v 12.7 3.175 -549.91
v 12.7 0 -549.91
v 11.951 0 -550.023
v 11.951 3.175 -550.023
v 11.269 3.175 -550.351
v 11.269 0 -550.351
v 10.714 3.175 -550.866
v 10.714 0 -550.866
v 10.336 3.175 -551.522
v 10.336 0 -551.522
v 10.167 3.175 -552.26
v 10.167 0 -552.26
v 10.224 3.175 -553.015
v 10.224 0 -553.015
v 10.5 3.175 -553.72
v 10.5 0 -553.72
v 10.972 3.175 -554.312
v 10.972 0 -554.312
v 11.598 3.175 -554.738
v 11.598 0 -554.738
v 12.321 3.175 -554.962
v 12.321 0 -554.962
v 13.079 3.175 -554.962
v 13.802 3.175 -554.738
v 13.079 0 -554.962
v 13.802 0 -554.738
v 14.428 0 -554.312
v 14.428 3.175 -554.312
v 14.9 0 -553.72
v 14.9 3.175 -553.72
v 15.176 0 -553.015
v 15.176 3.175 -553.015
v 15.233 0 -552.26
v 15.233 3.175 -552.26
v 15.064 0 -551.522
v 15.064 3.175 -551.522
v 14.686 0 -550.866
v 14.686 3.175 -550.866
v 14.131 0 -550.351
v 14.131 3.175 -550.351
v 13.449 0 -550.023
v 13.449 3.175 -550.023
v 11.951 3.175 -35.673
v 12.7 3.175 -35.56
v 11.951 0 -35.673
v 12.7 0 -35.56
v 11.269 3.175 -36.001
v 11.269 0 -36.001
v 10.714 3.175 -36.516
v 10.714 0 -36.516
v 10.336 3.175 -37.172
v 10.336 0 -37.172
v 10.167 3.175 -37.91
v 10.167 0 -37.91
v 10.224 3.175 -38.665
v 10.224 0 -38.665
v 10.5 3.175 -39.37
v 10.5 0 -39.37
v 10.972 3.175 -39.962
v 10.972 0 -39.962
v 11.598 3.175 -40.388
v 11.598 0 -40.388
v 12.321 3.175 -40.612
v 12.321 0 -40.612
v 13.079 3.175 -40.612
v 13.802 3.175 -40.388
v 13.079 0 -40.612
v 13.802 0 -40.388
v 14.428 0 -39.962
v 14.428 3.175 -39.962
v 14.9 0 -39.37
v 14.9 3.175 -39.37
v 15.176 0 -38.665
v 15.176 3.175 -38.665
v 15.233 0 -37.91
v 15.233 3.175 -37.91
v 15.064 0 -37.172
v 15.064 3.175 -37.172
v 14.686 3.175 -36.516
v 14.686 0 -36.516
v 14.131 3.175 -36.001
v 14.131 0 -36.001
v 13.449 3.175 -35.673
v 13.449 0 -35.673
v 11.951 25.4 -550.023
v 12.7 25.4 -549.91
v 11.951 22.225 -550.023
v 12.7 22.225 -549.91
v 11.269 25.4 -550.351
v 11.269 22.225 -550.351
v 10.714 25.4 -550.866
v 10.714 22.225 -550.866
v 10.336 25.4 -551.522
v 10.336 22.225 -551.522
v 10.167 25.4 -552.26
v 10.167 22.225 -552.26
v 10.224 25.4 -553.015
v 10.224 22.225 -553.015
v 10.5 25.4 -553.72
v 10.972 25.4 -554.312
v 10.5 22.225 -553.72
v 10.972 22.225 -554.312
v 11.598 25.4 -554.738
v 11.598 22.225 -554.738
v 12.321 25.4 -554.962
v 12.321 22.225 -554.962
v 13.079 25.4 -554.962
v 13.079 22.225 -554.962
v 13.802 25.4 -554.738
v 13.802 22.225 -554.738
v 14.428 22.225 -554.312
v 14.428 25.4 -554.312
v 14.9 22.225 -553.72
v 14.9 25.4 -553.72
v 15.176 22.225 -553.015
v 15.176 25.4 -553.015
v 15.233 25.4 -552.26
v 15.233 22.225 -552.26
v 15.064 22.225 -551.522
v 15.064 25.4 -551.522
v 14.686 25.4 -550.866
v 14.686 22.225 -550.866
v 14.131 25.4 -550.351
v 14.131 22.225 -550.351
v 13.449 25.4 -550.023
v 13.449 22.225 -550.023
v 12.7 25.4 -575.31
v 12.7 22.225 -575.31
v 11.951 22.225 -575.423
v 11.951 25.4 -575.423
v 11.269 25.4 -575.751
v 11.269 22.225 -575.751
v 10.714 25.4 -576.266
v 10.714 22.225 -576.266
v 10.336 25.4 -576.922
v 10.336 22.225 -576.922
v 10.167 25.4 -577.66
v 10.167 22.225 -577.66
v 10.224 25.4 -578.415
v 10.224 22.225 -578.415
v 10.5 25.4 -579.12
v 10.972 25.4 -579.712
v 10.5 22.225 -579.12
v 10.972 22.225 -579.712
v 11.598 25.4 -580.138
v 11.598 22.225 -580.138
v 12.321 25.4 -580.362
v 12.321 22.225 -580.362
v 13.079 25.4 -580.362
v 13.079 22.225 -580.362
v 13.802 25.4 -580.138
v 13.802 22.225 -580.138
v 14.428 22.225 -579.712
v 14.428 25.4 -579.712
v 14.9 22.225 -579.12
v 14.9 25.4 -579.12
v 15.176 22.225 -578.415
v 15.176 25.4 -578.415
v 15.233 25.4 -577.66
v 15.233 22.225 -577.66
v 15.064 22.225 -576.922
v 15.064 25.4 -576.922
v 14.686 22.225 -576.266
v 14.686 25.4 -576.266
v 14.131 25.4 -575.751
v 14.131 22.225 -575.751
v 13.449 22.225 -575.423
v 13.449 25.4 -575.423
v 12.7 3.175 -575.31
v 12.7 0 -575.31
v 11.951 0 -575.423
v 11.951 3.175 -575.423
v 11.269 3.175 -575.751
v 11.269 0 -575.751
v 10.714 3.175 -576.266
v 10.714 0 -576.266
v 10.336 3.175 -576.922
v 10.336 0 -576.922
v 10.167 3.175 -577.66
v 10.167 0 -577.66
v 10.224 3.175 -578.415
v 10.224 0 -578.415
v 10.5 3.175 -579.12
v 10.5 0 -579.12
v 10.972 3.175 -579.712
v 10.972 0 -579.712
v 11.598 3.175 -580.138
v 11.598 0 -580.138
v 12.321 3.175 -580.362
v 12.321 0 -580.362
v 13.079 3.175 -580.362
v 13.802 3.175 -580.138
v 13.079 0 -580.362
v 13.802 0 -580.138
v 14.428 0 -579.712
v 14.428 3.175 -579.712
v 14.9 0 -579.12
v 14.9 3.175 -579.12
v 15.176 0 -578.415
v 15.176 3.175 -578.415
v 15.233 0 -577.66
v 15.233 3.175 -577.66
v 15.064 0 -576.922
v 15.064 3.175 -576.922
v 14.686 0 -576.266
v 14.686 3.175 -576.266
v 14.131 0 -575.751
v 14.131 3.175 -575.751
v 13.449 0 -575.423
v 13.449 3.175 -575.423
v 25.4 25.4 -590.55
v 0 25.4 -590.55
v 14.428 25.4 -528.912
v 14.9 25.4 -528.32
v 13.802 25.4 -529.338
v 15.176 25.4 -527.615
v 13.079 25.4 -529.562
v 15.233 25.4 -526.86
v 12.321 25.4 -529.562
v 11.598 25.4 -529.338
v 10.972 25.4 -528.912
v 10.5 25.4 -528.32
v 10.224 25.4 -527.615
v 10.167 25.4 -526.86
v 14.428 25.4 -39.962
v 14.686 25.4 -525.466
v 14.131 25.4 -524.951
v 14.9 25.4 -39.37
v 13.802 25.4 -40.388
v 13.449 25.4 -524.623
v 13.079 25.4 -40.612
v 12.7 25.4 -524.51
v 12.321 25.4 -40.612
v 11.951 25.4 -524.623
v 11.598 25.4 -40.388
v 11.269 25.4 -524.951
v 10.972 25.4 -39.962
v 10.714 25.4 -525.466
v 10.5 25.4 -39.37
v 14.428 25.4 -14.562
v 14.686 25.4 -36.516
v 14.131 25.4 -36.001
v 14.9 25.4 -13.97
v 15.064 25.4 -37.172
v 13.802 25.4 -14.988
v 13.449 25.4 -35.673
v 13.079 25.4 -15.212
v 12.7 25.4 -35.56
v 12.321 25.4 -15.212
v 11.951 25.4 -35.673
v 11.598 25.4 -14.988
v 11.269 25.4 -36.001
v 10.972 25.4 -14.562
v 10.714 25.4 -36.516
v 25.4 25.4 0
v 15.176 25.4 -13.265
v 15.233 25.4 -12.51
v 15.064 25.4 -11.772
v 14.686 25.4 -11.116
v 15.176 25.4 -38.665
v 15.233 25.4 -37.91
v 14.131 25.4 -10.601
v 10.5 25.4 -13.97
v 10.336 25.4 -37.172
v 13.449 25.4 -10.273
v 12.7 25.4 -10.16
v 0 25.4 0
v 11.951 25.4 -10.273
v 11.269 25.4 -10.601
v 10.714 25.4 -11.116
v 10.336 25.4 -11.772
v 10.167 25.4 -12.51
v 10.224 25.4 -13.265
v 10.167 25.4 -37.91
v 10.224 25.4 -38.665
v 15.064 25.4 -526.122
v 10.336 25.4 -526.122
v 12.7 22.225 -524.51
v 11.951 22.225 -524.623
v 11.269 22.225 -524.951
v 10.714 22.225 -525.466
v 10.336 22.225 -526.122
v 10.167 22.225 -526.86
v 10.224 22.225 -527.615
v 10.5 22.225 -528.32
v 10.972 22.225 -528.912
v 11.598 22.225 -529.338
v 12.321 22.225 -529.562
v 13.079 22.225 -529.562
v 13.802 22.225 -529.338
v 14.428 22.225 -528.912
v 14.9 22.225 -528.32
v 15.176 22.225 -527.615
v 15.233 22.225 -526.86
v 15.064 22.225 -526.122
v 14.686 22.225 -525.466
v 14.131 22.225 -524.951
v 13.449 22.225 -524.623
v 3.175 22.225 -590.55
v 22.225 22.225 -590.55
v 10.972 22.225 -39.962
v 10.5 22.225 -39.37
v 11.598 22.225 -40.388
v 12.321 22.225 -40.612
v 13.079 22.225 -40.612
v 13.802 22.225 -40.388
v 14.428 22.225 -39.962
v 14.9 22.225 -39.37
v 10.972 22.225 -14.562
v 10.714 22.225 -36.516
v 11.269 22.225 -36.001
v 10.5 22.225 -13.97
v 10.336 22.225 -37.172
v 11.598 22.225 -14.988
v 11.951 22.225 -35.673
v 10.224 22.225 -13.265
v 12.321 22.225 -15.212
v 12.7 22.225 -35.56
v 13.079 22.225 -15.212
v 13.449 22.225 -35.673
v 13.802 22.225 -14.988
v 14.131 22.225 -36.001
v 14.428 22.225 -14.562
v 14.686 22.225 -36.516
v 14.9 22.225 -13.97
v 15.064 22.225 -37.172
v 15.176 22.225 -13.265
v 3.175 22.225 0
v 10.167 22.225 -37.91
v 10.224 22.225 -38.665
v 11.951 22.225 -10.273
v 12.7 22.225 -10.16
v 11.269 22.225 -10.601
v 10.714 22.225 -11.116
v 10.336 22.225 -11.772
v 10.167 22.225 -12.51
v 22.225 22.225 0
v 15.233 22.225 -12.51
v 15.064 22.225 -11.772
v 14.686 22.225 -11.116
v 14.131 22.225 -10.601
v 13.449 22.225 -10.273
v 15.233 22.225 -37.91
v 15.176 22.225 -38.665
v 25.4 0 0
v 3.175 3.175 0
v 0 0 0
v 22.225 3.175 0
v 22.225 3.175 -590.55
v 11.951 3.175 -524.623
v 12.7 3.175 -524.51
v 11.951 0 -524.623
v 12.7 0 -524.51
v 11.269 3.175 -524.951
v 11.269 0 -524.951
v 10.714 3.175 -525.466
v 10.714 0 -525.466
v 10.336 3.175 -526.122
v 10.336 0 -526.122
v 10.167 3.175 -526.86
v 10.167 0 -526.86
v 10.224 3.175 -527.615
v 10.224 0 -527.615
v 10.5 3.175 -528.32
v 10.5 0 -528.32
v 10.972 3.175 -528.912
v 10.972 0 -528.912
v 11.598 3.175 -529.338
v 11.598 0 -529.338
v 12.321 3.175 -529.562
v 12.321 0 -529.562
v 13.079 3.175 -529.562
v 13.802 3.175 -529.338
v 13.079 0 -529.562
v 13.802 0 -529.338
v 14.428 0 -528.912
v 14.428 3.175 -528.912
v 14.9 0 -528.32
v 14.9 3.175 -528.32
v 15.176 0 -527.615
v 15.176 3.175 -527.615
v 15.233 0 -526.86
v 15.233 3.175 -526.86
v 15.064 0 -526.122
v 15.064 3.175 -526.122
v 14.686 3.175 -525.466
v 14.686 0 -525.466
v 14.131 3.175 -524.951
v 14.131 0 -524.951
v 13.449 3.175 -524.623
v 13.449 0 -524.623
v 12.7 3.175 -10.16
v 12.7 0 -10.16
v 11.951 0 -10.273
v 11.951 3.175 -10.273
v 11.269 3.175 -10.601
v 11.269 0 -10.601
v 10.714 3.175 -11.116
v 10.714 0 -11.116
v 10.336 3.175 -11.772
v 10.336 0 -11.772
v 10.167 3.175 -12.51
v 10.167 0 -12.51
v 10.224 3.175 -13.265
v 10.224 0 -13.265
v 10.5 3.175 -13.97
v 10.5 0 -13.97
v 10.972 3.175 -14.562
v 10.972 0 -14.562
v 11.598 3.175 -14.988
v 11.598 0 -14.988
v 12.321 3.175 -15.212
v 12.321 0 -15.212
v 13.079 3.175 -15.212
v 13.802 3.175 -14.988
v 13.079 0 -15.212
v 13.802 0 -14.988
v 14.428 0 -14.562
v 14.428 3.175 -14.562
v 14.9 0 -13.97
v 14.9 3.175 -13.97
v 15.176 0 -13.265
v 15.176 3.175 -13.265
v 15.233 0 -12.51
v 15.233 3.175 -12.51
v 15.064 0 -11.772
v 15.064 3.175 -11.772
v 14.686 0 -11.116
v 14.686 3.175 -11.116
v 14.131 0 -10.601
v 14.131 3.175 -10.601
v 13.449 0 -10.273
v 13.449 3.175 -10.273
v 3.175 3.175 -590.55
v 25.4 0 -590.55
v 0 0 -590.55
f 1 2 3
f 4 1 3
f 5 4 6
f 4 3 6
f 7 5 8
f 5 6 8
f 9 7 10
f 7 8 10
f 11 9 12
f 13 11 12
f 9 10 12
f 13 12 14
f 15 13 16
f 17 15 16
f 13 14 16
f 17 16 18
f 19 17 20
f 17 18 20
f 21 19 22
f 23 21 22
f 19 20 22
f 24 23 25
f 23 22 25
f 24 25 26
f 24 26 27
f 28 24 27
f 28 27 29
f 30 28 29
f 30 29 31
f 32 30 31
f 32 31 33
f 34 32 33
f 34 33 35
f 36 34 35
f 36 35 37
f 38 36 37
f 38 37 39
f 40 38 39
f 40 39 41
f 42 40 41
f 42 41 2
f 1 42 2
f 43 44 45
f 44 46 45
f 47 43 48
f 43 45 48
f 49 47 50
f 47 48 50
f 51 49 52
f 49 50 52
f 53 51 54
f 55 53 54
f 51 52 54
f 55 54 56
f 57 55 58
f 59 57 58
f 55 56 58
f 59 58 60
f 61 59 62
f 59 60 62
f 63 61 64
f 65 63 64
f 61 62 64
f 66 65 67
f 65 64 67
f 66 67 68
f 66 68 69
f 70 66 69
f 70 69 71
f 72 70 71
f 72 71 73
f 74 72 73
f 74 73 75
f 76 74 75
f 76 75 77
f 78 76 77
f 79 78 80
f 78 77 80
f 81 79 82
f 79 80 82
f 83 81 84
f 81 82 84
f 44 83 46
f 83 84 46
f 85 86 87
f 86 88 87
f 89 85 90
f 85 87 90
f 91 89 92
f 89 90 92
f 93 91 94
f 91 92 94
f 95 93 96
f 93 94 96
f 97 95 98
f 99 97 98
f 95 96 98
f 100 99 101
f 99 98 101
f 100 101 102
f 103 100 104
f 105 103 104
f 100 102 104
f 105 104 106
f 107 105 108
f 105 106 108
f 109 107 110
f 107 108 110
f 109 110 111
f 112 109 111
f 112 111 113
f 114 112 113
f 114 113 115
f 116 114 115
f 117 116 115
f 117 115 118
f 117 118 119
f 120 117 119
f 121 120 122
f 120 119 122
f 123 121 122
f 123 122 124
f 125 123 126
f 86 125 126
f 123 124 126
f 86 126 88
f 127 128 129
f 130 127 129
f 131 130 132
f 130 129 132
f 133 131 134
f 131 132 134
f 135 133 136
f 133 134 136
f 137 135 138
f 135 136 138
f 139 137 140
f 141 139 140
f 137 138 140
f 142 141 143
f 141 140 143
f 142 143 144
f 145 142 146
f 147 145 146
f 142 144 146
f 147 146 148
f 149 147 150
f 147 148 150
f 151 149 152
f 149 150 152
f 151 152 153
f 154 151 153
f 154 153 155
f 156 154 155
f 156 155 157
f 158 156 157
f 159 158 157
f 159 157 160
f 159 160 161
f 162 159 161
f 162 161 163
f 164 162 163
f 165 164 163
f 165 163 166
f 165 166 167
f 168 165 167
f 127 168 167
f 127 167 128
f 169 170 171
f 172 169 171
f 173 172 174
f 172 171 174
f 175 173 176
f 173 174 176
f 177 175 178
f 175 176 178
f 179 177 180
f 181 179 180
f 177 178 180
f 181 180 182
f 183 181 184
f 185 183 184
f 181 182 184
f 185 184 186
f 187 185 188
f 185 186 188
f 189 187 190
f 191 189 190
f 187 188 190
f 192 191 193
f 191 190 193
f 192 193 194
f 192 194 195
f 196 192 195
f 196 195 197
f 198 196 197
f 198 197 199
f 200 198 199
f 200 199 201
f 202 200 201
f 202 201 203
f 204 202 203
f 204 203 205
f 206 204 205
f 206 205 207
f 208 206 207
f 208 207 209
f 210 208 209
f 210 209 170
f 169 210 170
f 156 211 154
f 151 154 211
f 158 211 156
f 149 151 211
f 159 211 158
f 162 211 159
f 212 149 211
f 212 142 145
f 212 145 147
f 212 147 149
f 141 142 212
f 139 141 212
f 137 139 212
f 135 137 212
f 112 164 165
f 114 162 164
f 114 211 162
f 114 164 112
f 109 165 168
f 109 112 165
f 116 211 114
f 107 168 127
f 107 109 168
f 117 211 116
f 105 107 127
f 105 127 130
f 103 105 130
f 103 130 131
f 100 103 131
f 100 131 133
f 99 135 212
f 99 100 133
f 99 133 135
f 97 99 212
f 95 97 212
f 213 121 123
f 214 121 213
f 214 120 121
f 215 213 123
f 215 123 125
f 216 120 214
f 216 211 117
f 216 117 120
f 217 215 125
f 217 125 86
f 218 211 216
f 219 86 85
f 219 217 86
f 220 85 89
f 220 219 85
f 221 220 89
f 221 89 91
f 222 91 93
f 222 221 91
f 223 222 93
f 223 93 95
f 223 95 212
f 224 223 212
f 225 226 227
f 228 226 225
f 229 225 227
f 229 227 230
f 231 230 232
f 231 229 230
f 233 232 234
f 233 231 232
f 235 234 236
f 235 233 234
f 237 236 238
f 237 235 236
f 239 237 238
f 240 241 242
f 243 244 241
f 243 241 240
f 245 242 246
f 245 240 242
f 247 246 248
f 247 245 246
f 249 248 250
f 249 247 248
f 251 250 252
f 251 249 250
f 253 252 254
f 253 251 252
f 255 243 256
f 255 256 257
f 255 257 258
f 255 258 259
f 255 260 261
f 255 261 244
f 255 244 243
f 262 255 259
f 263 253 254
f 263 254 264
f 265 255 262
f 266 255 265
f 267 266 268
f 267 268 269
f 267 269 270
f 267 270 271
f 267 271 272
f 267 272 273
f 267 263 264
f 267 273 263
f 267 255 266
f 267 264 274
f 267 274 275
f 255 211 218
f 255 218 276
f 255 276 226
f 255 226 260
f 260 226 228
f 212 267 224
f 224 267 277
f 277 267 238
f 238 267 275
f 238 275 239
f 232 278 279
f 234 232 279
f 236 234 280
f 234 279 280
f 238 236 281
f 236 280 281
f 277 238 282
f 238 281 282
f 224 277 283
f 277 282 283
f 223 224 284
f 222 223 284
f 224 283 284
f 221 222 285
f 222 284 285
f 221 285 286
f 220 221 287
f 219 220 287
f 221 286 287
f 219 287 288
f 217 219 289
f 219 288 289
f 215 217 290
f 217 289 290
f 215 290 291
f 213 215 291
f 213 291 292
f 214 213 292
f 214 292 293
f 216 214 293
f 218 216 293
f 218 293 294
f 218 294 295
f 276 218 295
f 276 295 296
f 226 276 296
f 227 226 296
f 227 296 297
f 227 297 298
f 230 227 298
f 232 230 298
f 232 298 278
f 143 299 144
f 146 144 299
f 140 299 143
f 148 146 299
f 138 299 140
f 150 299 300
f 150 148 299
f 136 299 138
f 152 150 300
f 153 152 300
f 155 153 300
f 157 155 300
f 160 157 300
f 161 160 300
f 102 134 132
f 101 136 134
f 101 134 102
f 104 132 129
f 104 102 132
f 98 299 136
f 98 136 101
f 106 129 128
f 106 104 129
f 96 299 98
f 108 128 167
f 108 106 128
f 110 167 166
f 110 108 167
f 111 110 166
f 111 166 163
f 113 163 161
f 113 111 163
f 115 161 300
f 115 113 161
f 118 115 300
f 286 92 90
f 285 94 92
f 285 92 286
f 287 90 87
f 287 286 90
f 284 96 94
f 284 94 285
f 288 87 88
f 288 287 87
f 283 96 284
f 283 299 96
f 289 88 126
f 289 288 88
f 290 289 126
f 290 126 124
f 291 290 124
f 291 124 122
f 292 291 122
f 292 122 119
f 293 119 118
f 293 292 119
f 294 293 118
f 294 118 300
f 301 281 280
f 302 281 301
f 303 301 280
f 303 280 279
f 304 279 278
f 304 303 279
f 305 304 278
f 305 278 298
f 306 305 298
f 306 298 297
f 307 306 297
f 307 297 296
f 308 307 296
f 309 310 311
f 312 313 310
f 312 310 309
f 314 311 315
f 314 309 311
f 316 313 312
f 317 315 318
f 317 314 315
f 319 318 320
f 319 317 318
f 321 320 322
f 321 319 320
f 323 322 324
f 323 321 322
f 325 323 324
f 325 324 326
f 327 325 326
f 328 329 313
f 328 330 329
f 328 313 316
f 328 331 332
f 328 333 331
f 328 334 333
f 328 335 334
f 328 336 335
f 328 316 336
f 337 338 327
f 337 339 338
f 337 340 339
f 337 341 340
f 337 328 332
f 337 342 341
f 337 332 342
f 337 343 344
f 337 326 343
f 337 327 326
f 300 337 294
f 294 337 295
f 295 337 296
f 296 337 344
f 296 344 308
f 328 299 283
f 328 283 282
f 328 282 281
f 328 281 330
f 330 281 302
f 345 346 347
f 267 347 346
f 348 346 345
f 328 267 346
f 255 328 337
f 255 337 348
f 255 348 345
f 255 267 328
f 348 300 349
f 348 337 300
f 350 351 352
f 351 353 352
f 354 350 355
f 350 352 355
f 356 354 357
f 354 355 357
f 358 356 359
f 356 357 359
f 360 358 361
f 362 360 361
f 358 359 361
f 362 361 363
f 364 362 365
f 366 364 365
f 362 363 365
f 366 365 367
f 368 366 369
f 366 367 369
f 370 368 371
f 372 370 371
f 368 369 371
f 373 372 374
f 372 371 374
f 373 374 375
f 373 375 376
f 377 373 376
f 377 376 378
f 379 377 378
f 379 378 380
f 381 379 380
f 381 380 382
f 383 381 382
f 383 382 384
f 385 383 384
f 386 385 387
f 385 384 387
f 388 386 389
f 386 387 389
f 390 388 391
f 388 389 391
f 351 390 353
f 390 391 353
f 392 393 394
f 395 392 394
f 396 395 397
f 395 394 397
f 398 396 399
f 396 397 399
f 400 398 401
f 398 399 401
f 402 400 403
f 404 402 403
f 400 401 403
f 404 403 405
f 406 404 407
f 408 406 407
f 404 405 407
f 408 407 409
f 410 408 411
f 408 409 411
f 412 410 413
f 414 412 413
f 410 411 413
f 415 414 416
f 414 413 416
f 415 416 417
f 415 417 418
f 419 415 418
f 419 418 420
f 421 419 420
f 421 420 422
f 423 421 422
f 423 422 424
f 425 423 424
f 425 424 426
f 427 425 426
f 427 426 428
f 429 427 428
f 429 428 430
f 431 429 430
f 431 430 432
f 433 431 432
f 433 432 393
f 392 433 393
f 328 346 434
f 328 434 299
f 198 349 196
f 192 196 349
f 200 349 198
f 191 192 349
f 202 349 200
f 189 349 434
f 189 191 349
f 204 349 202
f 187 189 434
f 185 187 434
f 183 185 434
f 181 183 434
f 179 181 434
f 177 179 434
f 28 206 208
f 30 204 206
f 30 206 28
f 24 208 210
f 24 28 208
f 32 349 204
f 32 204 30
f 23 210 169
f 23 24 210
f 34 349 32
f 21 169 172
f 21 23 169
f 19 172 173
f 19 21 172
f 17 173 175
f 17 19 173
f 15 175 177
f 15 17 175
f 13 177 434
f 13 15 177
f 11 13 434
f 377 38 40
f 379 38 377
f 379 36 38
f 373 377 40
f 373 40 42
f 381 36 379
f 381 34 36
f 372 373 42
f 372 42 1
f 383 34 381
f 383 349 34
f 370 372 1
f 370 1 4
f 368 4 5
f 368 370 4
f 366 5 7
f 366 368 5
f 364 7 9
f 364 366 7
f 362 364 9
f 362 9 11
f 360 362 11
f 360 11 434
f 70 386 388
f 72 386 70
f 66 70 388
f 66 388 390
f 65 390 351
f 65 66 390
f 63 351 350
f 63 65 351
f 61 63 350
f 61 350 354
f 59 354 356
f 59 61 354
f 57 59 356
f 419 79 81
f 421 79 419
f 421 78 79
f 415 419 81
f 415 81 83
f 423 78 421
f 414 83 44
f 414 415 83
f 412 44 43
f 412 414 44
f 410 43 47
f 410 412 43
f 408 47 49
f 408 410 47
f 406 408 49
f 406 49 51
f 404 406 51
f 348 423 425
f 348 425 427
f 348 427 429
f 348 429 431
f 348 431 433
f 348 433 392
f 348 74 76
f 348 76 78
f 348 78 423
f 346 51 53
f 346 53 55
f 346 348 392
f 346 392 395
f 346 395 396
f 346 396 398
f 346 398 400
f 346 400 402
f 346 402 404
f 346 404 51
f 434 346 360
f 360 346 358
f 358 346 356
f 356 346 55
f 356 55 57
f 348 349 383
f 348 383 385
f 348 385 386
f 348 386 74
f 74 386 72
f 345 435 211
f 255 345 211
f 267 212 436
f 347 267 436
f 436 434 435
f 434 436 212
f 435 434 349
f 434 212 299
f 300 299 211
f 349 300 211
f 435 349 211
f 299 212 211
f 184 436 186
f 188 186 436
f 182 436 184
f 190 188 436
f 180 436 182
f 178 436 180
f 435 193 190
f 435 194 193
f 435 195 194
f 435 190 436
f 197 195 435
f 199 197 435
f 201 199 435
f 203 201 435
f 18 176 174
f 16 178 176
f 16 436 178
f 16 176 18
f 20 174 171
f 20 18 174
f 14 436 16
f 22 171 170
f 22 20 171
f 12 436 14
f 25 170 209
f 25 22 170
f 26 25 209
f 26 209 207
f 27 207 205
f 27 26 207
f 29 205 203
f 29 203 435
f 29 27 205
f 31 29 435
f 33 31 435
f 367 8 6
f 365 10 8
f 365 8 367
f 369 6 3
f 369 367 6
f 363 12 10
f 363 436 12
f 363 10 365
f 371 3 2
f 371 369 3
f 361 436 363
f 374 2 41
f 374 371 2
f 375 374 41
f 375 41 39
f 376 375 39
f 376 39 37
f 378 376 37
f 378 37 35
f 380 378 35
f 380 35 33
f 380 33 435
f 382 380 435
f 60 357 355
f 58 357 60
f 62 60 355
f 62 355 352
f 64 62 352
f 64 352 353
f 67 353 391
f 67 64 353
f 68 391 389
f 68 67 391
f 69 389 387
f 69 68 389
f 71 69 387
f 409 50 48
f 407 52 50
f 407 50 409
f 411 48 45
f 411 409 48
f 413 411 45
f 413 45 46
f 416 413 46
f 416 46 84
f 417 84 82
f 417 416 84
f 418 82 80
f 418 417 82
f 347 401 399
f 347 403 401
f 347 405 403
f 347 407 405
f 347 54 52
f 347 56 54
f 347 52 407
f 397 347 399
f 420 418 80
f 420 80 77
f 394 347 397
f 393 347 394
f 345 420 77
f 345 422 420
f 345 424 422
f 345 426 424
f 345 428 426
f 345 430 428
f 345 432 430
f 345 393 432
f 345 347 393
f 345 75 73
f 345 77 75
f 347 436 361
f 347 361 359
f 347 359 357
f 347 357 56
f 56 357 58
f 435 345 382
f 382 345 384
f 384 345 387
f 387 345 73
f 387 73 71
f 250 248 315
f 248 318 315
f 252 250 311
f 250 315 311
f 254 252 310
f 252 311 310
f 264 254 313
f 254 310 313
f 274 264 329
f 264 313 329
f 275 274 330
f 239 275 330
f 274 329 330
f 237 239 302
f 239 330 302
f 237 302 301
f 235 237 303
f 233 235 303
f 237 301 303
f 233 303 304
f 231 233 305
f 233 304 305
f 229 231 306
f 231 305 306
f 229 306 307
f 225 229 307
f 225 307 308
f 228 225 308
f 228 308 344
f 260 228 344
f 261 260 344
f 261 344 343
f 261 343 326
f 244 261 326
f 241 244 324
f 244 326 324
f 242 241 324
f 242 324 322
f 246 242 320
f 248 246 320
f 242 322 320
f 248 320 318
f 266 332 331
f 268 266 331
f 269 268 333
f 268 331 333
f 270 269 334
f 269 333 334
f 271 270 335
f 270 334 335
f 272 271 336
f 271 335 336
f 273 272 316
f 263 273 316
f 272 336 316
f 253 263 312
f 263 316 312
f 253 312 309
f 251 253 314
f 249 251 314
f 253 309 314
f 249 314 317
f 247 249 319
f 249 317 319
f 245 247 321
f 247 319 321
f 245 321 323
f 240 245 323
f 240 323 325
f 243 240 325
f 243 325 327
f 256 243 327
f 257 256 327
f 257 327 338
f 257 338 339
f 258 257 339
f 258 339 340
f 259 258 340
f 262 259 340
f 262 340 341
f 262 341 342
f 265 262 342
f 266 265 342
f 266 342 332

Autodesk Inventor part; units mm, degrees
ref_plane "YZ Plane" through (0, 0, 0) normal (1, 0, 0) x (0, 1, 0)
ref_plane "XZ Plane" through (0, 0, 0) normal (0, 1, 0) x (-1, 0, 0)
ref_plane "XY Plane" through (0, 0, 0) normal (0, 0, 1) x (1, 0, 0)
sketch "Sketch1" plane through (0, 0, 0) normal (0, 0, 1) x (1, 0, 0)
  line L0 (0, 0) -> (25.4, 0)
  line L1 (25.4, 0) -> (25.4, 25.4)
  line L2 (25.4, 25.4) -> (0, 25.4)
  line L3 (0, 25.4) -> (0, 0)
  line L4 (3.175, 22.225) -> (22.225, 22.225)
  line L5 (22.225, 22.225) -> (22.225, 3.175)
  line L6 (22.225, 3.175) -> (3.175, 3.175)
  line L7 (3.175, 3.175) -> (3.175, 22.225)
  dimension "d0" = 25.4
  dimension "d1" = 25.4
  dimension "d2" = 3.175
extrude "Extrusion1" add sketch "Sketch1" against normal blind 590.55
sketch "Sketch4" plane through (0, 25.4, 0) normal (0, 1, 0) x (1, 0, 0)
  line L0 (25.4, 590.55) -> (0, 590.55) projected
  line L1 (25.4, 0) -> (0, 0) projected
  point P0 (12.7, 12.7)
  point P1 (12.7, 38.1)
  point P2 (12.7, 577.85)
  point P3 (12.7, 552.45)
  point P4 (12.7, 527.05)
  dimension "d32" = 12.7
  dimension "d33" = 25.4
  dimension "d34" = 12.7
  dimension "d35" = 25.4
  dimension "d36" = 25.4
hole "Hole4" at (12.7, 25.4, -12.7) at (12.7, 25.4, -38.1) at (12.7, 25.4, -577.85) at (12.7, 25.4, -552.45) at (12.7, 25.4, -527.05) direction (0, -1, 0) diameter 5.08 depth 25.4 tip angle 118
properties part number "new horizontall kicker thing"
